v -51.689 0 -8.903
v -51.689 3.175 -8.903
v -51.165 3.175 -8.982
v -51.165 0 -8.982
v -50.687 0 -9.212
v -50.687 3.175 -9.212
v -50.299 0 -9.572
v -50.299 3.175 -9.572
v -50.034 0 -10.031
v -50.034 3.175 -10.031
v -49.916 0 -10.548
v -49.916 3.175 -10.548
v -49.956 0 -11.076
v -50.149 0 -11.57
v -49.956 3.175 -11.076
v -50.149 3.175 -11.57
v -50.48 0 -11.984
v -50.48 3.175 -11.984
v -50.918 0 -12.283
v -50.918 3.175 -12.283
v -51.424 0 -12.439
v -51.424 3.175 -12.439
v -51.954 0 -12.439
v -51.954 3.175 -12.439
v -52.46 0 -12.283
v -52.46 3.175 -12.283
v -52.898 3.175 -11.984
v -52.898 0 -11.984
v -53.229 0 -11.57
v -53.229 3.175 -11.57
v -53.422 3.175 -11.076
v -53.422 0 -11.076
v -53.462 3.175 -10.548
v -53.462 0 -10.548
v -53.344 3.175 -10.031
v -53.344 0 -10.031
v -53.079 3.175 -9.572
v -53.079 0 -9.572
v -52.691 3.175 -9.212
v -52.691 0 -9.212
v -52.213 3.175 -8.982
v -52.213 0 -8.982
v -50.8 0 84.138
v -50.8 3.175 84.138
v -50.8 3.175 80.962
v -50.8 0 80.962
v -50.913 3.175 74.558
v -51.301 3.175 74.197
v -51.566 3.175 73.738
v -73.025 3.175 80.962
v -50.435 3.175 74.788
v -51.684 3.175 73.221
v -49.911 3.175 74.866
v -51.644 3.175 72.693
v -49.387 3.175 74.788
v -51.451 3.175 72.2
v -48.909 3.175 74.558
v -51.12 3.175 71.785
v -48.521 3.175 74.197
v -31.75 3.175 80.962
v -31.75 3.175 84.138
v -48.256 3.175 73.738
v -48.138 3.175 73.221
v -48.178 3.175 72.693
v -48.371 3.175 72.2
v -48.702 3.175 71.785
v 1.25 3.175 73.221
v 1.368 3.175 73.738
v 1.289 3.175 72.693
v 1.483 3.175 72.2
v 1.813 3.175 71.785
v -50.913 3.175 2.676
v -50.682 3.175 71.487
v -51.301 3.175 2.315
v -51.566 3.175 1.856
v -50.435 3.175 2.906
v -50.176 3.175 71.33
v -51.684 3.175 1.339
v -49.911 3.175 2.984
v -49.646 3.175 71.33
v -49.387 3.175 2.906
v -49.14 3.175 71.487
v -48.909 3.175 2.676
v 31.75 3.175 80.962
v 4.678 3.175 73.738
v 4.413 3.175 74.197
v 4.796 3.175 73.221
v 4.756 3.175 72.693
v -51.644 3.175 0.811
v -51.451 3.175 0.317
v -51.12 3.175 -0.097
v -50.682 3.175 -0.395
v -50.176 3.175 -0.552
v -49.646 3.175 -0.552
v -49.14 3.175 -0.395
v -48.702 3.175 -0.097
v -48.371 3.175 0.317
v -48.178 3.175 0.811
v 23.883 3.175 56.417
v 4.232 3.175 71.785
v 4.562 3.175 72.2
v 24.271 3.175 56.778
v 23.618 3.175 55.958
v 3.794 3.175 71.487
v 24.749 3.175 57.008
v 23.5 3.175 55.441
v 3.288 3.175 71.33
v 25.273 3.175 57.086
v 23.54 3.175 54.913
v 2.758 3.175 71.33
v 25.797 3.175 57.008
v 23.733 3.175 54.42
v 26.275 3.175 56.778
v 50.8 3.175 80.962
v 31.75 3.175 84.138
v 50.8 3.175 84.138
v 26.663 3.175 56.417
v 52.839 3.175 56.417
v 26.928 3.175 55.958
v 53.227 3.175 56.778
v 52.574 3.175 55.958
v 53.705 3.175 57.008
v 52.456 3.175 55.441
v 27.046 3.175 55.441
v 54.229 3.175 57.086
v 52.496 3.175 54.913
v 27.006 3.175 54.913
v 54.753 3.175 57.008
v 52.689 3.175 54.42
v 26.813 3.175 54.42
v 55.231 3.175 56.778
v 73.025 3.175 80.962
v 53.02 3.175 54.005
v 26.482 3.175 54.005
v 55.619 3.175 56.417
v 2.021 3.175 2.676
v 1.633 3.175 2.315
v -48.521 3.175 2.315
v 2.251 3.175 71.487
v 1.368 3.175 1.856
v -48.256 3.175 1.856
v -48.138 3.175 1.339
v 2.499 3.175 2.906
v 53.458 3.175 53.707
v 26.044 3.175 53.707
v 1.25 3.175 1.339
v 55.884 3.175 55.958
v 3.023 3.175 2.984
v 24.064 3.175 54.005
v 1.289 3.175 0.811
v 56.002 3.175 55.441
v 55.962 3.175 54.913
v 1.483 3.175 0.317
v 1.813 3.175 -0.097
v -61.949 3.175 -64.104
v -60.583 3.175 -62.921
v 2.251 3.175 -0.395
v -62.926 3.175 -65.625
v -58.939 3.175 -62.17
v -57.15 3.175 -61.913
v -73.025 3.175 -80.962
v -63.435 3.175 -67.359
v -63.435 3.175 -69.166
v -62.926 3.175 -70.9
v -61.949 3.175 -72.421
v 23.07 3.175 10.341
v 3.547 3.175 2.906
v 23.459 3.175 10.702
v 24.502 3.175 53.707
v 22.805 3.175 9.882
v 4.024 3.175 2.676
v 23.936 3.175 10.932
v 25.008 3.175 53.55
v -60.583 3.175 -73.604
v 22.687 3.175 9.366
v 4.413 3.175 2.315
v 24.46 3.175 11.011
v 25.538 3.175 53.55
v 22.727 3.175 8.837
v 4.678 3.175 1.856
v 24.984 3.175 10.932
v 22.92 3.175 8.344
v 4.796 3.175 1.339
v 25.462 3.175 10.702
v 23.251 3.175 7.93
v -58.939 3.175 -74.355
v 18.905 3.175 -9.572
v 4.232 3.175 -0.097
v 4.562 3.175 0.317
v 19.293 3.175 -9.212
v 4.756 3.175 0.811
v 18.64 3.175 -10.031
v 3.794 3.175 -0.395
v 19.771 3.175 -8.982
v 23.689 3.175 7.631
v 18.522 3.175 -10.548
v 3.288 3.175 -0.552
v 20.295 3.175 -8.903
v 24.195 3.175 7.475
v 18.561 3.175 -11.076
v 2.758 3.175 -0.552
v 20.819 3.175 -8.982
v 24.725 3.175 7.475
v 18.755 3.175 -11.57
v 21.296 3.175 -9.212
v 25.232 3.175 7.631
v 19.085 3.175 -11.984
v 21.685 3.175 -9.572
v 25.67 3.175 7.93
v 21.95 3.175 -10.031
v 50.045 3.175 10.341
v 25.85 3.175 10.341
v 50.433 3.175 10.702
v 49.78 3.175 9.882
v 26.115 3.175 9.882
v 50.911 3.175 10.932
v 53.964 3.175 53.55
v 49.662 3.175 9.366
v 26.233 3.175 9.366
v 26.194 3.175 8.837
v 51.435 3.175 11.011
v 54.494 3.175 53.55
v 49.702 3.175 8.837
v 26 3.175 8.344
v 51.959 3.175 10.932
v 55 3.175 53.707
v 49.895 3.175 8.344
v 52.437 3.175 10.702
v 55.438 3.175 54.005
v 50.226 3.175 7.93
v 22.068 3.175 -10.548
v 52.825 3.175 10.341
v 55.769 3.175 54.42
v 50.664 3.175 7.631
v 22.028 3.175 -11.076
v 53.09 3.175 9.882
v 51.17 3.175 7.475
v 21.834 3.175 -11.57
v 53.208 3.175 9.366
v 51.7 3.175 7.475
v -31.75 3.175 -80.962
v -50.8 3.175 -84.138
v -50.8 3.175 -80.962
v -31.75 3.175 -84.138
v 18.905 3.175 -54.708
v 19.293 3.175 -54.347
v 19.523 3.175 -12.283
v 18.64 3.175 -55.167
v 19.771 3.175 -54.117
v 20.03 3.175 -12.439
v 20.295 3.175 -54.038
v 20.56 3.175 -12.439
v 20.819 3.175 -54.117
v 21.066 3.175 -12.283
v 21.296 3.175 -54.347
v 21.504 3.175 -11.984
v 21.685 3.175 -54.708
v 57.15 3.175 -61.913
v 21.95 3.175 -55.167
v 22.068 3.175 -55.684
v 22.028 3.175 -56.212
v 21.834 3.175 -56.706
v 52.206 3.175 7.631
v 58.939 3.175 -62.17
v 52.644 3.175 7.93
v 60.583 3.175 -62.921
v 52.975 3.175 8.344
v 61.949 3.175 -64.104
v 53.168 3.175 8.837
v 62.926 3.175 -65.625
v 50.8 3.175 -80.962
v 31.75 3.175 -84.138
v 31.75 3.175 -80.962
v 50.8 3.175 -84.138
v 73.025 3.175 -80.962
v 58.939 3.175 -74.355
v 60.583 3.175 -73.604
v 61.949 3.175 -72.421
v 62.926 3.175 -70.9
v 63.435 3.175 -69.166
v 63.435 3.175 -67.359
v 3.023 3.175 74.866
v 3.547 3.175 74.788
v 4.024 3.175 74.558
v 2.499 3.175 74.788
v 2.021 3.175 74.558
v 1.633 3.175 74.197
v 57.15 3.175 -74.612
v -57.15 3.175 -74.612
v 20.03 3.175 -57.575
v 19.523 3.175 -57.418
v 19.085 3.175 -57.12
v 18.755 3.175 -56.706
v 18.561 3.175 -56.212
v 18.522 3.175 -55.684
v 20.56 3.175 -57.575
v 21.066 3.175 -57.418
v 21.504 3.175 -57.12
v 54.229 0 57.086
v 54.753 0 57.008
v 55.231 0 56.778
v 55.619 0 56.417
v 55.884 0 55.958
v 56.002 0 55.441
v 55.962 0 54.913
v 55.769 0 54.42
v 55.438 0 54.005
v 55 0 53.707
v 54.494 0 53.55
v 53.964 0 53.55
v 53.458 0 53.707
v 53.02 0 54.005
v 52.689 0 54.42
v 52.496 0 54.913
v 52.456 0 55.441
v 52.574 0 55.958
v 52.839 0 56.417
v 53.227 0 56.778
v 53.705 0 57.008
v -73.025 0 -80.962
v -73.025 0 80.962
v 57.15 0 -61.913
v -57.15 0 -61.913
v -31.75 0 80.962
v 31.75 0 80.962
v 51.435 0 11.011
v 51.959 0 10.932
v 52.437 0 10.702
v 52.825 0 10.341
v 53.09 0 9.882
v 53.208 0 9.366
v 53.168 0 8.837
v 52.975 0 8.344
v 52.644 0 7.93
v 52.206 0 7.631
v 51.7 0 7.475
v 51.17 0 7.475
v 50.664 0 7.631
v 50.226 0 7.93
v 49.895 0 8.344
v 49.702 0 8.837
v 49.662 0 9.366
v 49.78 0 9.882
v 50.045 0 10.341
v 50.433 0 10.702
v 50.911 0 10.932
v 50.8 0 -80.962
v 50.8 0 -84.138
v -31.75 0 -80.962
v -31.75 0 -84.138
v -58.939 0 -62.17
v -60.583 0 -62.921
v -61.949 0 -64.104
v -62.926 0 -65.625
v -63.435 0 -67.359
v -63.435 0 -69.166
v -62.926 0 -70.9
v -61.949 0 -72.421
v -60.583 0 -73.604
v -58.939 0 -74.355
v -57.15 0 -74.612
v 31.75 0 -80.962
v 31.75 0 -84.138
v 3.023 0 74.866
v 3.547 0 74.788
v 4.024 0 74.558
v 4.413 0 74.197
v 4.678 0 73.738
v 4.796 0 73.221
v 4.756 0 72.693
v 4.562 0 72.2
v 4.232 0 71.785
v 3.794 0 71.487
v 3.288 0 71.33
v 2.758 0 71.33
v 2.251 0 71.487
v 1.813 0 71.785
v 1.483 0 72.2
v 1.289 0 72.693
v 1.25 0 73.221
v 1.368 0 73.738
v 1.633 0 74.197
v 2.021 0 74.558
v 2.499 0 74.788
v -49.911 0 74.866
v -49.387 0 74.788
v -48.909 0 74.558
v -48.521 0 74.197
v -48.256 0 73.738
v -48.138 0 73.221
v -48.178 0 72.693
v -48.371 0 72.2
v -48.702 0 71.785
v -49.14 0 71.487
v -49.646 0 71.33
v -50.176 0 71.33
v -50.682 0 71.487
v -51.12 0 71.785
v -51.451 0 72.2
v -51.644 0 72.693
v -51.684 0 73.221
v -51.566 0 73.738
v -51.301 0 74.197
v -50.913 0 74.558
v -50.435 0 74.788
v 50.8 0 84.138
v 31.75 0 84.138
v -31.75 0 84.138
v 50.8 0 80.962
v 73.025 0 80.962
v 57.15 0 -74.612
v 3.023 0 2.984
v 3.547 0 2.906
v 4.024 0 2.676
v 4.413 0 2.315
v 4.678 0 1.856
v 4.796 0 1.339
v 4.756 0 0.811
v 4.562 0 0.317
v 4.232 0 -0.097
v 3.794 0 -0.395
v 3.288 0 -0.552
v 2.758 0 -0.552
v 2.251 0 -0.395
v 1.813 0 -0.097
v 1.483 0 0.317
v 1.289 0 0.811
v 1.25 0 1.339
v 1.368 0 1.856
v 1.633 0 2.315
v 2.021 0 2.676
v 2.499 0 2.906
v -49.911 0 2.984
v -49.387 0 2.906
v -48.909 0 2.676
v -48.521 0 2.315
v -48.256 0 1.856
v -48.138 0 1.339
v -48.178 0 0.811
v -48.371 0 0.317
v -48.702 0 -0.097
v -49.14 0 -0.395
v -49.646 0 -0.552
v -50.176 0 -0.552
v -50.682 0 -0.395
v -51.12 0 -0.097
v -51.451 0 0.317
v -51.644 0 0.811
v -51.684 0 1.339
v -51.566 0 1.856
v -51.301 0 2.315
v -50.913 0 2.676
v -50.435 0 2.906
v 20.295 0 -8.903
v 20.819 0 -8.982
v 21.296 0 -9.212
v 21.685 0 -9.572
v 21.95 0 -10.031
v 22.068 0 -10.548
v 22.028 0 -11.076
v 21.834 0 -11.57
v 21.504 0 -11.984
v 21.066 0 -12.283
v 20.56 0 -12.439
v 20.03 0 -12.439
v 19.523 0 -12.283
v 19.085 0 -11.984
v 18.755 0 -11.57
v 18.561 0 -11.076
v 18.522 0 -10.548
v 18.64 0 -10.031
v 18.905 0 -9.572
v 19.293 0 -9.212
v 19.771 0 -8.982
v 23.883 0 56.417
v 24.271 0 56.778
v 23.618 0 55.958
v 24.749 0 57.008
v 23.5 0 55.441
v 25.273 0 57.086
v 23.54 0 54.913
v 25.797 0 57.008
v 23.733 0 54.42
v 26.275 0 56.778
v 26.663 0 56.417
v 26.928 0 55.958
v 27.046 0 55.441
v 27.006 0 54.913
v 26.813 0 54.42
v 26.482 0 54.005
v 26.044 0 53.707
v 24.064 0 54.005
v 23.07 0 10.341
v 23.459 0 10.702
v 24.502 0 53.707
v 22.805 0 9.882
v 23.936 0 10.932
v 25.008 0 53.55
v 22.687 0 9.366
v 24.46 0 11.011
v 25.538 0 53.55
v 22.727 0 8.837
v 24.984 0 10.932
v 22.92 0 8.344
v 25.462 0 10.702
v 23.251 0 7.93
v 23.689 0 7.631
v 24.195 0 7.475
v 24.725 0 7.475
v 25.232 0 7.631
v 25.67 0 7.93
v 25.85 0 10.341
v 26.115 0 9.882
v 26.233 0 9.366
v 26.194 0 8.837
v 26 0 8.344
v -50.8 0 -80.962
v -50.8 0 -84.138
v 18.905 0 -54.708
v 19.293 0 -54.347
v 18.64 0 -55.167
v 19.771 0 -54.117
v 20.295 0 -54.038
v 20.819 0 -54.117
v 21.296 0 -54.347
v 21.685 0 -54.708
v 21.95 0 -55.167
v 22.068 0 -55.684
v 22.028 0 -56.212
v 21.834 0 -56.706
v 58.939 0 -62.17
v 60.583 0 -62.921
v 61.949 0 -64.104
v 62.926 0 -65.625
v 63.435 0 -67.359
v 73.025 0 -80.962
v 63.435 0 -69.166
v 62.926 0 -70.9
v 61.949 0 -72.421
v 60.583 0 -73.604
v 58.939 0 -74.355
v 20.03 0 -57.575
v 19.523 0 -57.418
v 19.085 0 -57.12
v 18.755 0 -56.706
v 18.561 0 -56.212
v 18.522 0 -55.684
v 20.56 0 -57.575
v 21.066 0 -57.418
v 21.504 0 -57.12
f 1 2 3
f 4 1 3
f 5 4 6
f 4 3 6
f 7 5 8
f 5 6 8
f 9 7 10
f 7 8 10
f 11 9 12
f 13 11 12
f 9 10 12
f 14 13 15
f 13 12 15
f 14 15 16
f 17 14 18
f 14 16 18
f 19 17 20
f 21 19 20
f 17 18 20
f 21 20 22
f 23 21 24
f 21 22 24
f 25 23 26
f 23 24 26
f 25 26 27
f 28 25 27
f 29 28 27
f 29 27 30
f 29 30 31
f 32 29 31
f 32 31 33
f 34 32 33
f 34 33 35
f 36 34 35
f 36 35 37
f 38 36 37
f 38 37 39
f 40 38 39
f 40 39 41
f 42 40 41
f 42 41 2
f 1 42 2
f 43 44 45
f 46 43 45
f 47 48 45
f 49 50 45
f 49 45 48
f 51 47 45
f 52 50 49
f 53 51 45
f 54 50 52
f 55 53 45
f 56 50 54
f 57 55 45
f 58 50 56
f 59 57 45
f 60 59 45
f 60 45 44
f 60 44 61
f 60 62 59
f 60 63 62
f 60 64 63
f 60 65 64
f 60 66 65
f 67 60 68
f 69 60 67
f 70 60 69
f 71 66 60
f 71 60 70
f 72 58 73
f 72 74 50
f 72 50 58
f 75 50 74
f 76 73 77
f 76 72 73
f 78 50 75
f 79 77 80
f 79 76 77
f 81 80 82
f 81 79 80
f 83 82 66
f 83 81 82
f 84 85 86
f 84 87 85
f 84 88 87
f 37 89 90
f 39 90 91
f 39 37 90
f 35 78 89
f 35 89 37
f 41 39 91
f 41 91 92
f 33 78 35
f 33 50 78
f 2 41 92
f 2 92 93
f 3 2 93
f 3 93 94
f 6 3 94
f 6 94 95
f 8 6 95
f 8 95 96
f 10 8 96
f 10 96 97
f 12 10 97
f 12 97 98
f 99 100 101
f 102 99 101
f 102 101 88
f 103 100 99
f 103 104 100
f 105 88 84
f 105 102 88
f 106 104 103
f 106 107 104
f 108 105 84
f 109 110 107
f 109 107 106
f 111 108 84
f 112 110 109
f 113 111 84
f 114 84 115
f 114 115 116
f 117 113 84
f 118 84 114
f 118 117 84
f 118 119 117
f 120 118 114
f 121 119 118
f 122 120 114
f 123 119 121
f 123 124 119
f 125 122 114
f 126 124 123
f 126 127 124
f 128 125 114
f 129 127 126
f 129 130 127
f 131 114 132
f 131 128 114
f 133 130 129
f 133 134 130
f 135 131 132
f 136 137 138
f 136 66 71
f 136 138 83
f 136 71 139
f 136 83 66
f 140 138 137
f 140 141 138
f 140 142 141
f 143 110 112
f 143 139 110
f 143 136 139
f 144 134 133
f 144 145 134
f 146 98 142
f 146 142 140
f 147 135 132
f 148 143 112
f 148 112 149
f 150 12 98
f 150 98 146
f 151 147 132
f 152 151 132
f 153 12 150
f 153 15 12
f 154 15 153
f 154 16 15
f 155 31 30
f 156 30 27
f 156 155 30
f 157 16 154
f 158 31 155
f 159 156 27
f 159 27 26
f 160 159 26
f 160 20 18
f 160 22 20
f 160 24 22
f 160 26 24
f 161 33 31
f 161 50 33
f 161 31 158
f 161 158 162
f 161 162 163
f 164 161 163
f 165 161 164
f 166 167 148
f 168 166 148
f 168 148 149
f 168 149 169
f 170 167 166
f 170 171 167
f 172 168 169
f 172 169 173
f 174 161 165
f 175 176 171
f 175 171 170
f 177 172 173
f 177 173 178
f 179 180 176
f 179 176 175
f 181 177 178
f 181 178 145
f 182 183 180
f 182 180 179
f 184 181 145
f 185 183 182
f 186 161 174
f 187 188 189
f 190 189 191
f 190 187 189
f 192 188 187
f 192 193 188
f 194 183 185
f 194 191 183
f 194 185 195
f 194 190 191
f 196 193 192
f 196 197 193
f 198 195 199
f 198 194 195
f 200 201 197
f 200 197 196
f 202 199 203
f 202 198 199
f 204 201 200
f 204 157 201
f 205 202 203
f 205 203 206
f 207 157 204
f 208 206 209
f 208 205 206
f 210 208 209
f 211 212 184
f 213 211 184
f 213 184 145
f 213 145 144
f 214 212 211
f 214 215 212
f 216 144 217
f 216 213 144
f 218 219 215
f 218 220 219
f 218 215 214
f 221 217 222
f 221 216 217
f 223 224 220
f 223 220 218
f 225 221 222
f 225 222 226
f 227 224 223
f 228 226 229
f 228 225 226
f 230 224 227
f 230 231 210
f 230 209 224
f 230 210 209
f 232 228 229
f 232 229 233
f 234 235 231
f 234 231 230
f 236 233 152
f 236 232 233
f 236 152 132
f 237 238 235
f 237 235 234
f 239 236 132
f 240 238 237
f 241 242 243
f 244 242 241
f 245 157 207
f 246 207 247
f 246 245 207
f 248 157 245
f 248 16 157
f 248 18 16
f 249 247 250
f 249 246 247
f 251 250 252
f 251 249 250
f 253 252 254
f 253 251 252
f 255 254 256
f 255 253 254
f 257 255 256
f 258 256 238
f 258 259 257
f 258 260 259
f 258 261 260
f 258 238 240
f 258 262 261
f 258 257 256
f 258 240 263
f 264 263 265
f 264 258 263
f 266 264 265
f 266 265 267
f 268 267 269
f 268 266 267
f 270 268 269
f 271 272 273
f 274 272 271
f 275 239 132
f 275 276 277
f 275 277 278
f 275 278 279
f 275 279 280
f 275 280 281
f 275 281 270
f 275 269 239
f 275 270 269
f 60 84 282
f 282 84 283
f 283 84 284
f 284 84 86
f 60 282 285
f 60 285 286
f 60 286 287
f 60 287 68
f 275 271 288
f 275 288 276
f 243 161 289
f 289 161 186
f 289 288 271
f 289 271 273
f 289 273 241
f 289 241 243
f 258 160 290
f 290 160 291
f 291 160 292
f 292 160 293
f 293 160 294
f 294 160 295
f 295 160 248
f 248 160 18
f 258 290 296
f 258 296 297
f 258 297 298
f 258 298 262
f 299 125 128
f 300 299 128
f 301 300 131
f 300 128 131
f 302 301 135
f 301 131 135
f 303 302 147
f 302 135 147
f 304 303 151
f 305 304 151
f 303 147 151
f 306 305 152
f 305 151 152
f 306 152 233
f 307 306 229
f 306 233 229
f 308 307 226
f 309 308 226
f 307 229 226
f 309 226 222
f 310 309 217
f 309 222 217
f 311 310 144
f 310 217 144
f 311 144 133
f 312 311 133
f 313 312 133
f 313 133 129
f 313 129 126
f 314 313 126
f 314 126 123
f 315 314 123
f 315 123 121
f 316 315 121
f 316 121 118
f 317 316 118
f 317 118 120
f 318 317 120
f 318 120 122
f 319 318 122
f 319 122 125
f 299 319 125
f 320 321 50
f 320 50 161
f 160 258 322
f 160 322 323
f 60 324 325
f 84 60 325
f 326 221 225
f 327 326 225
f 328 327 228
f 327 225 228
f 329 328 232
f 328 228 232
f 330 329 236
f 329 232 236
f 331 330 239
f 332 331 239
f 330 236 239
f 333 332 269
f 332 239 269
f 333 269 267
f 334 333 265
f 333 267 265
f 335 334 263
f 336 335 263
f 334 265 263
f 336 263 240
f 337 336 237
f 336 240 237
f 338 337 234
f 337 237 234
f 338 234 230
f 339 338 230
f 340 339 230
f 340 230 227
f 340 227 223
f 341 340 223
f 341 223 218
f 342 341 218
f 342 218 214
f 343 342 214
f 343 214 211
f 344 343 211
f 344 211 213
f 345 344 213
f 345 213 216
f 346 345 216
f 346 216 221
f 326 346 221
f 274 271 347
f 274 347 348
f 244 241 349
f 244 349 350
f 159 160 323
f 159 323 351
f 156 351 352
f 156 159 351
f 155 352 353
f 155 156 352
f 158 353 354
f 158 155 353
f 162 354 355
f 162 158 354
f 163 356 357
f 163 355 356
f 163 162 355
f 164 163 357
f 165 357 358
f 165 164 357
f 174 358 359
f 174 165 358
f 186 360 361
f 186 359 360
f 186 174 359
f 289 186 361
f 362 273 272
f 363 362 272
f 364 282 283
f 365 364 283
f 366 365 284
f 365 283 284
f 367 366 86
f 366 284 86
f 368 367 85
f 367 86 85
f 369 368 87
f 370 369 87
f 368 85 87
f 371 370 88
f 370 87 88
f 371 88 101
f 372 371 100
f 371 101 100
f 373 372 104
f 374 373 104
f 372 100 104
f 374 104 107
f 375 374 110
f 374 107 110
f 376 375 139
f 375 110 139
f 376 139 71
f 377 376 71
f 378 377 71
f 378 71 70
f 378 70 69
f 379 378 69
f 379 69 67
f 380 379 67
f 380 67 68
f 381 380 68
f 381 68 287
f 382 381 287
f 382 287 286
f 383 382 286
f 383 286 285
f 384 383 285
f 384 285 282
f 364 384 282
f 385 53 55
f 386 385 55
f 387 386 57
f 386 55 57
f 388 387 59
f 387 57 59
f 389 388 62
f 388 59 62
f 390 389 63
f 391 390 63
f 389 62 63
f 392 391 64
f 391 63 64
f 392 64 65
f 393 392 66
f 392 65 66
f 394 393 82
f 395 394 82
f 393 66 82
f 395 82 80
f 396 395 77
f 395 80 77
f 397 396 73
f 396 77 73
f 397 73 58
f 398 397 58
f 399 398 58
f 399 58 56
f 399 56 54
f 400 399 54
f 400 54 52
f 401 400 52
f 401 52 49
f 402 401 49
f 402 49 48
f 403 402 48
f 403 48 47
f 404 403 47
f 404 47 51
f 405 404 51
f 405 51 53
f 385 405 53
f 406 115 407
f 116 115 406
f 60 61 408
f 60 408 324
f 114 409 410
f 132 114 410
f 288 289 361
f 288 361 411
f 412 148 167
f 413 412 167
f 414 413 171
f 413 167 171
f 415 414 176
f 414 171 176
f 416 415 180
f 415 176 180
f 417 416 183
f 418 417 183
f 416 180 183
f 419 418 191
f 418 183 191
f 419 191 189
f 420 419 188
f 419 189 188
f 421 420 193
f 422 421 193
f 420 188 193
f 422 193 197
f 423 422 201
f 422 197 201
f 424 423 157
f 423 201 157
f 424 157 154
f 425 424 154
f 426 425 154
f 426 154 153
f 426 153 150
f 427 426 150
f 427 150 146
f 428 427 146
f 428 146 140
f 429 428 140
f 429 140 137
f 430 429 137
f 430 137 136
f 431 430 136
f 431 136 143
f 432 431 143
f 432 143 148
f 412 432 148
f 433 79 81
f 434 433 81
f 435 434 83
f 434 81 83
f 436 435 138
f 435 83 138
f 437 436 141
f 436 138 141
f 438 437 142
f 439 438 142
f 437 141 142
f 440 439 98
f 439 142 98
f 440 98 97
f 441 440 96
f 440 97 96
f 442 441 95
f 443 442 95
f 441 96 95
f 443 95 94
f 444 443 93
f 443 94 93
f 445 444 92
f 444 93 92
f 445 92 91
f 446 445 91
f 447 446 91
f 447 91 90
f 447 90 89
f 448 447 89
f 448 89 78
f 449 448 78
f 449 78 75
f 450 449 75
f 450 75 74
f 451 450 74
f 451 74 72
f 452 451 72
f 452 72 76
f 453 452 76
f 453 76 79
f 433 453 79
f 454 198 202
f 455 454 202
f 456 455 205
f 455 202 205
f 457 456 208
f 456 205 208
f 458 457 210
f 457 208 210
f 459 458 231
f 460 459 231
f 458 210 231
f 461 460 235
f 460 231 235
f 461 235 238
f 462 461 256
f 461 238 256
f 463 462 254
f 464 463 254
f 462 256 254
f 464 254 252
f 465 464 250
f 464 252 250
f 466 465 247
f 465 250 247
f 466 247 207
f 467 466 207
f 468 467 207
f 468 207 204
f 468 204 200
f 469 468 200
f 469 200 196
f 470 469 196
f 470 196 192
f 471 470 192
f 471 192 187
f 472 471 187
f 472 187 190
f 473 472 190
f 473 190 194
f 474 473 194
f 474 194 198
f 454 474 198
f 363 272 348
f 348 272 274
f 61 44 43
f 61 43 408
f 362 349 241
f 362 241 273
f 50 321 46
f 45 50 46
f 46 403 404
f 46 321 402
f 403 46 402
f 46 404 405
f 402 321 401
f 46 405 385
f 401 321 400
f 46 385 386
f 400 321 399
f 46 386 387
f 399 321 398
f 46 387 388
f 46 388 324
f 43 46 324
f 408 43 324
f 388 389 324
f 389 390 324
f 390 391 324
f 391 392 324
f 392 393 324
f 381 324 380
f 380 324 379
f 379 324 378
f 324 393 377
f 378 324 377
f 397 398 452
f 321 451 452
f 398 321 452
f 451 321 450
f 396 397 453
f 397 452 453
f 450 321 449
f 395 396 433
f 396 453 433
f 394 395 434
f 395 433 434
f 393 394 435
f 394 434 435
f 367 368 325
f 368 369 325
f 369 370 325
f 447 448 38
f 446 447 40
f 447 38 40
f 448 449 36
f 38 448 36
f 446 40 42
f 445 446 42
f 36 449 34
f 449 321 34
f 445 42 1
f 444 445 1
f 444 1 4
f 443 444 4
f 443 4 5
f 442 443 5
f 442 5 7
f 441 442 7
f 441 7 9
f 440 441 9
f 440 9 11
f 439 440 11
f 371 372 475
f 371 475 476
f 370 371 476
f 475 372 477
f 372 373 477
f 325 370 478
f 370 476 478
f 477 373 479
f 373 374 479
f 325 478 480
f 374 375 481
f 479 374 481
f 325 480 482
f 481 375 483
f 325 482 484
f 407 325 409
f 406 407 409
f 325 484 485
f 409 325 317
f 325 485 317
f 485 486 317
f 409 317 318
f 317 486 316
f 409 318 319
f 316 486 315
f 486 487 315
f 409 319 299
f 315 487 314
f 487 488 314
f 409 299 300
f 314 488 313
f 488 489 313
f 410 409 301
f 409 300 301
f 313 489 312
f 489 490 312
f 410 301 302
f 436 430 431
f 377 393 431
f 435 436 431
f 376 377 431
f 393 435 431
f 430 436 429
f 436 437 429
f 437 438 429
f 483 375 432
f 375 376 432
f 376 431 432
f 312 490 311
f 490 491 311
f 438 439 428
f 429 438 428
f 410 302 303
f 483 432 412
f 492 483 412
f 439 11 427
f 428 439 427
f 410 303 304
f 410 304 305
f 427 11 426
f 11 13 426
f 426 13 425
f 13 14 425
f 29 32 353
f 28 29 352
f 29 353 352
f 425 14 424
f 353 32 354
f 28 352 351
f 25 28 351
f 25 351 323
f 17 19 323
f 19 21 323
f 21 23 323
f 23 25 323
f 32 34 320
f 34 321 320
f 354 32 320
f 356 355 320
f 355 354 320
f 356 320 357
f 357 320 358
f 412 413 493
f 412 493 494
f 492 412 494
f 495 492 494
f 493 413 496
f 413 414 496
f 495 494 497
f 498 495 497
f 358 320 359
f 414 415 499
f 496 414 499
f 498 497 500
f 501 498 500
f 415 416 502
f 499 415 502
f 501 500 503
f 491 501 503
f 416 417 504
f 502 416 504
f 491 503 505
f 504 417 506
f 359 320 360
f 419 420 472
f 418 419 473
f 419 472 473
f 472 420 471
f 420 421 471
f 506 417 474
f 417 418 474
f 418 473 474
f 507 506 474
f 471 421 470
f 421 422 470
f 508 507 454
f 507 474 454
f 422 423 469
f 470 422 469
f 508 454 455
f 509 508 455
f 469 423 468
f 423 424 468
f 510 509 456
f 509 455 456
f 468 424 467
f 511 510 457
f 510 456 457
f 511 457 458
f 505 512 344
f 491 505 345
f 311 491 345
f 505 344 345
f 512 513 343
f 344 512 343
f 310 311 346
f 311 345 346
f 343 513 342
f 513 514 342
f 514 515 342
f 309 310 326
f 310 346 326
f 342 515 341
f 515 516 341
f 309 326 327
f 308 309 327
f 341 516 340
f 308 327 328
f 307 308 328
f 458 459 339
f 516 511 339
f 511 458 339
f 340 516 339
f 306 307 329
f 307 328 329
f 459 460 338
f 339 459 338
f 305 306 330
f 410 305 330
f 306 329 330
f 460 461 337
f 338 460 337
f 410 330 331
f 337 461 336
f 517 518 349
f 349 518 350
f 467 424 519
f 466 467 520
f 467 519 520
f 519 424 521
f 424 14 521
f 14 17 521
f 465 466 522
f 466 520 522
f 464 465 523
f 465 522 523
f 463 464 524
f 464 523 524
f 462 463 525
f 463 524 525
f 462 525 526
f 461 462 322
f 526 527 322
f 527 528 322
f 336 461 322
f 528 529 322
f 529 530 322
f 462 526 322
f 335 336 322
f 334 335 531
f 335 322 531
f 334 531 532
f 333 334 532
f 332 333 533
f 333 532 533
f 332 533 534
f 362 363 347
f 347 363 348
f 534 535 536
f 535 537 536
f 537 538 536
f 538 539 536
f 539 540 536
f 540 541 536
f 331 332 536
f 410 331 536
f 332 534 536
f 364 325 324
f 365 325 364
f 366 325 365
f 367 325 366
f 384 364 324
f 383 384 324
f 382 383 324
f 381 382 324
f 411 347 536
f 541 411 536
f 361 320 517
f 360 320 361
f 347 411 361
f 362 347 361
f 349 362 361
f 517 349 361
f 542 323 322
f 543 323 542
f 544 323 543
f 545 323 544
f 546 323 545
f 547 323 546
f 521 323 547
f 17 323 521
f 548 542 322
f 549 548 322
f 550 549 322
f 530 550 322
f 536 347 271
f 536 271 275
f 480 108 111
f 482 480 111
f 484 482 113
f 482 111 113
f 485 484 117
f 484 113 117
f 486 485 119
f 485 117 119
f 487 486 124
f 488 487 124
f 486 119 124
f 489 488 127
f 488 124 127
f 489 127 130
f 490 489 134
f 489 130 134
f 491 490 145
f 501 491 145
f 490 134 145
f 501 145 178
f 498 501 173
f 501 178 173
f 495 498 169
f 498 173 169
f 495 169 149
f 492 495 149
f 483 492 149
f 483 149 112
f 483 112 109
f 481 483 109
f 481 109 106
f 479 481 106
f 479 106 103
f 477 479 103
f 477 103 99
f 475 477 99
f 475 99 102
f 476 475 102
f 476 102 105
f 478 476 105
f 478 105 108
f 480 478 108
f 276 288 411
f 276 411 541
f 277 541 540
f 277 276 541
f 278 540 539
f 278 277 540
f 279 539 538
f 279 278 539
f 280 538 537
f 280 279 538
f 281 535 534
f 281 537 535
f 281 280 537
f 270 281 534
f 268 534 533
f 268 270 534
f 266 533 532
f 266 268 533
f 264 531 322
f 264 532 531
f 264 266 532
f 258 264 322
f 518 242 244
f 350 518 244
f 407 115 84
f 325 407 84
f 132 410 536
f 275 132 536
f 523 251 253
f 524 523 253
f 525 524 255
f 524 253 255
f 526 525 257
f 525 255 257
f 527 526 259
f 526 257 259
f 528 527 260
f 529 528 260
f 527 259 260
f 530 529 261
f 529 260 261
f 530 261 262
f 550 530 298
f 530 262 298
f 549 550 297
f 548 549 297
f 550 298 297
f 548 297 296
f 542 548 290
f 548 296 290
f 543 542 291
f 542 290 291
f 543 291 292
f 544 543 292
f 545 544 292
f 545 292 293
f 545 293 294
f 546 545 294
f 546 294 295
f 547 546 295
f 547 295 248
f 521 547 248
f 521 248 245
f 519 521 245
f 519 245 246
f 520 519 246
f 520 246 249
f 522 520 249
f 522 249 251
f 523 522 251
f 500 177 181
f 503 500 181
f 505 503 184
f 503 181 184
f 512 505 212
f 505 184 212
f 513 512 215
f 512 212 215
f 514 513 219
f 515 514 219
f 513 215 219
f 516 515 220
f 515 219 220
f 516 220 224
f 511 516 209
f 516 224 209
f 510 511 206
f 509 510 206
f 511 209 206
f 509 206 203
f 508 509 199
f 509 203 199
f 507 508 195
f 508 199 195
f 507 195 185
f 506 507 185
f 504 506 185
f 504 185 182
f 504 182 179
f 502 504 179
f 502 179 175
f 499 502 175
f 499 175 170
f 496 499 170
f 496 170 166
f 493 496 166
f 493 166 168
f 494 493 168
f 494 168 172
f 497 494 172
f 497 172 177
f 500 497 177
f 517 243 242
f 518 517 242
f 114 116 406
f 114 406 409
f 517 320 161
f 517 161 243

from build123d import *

# Parameters (mm, degrees)
SKETCH1_W           = 146.05
SKETCH1_H           = 161.925
BOSS_EXTRUDE1_DEPTH = 3.175
SKETCH2_W           = 19.05
SKETCH2_H           = 3.175
BOSS_EXTRUDE2_DEPTH = 3.175
CUT_EXTRUDE1_DEPTH  = 112.453354172
CUT_EXTRUDE2_REACH  = 113.453
SKETCH4_R           = 1.778


with BuildPart() as part:
    # Sketch1 → Boss-Extrude1 (new body)
    with BuildSketch(Plane(origin=(0, 0, 0), x_dir=(1, 0, 0), z_dir=(0, 1, 0))):
        Rectangle(SKETCH1_W, SKETCH1_H)
    extrude(amount=BOSS_EXTRUDE1_DEPTH)

    # Sketch2 → Boss-Extrude2 (add)
    with BuildSketch(Plane(origin=(0, 3.175, 0), x_dir=(1, 0, 0), z_dir=(0, 1, 0))):
        with Locations((-41.275, 82.55)):
            Rectangle(SKETCH2_W, SKETCH2_H)
        with Locations((41.275, 82.55)):
            Rectangle(SKETCH2_W, SKETCH2_H)
        with Locations((41.275, -82.55)):
            Rectangle(SKETCH2_W, SKETCH2_H)
        with Locations((-41.275, -82.55)):
            Rectangle(SKETCH2_W, SKETCH2_H)
    extrude(amount=-BOSS_EXTRUDE2_DEPTH)

    # Sketch3 → Cut-Extrude1 (cut, through all)
    with BuildSketch(Plane(origin=(0, 3.175, 0), x_dir=(1, 0, 0), z_dir=(0, 1, 0))):
        with BuildLine():
            Line((-57.15, 74.6125), (57.15, 74.6125))
            ThreePointArc((57.15, 74.6125), (63.5, 68.2625), (57.15, 61.9125))
            Line((57.15, 61.9125), (-57.15, 61.9125))
            ThreePointArc((-57.15, 61.9125), (-63.5, 68.2625), (-57.15, 74.6125))
        make_face()
    extrude(amount=-CUT_EXTRUDE1_DEPTH, mode=Mode.SUBTRACT)

    # Sketch4 → Cut-Extrude2 (cut, up to next)
    with BuildSketch(Plane(origin=(0, 3.175, 0), x_dir=(1, 0, 0), z_dir=(0, 1, 0)), mode=Mode.PRIVATE) as cut_extrude2_sk1:
        with Locations(Location((54.229, -55.3085, 0), (0, 0, 270))):
            Circle(SKETCH4_R)
    cut_extrude2_tool1 = extrude(cut_extrude2_sk1.sketch, amount=-CUT_EXTRUDE2_REACH, mode=Mode.PRIVATE) & part.part
    # Sketch4 → Cut-Extrude2 (cut, up to next)
    with BuildSketch(Plane(origin=(0, 3.175, 0), x_dir=(1, 0, 0), z_dir=(0, 1, 0)), mode=Mode.PRIVATE) as cut_extrude2_sk2:
        with Locations(Location((25.273, -55.3085, 0), (0, 0, 270))):
            Circle(SKETCH4_R)
    cut_extrude2_tool2 = extrude(cut_extrude2_sk2.sketch, amount=-CUT_EXTRUDE2_REACH, mode=Mode.PRIVATE) & part.part
    # Sketch4 → Cut-Extrude2 (cut, up to next)
    with BuildSketch(Plane(origin=(0, 3.175, 0), x_dir=(1, 0, 0), z_dir=(0, 1, 0)), mode=Mode.PRIVATE) as cut_extrude2_sk3:
        with Locations(Location((24.4602, -9.2329, 0), (0, 0, 270))):
            Circle(SKETCH4_R)
    cut_extrude2_tool3 = extrude(cut_extrude2_sk3.sketch, amount=-CUT_EXTRUDE2_REACH, mode=Mode.PRIVATE) & part.part
    # Sketch4 → Cut-Extrude2 (cut, up to next)
    with BuildSketch(Plane(origin=(0, 3.175, 0), x_dir=(1, 0, 0), z_dir=(0, 1, 0)), mode=Mode.PRIVATE) as cut_extrude2_sk4:
        with Locations(Location((51.435, -9.2329, 0), (0, 0, 270))):
            Circle(SKETCH4_R)
    cut_extrude2_tool4 = extrude(cut_extrude2_sk4.sketch, amount=-CUT_EXTRUDE2_REACH, mode=Mode.PRIVATE) & part.part
    # Sketch4 → Cut-Extrude2 (cut, up to next)
    with BuildSketch(Plane(origin=(0, 3.175, 0), x_dir=(1, 0, 0), z_dir=(0, 1, 0)), mode=Mode.PRIVATE) as cut_extrude2_sk5:
        with Locations(Location((3.0226, -73.0885, 0), (0, 0, 270))):
            Circle(SKETCH4_R)
    cut_extrude2_tool5 = extrude(cut_extrude2_sk5.sketch, amount=-CUT_EXTRUDE2_REACH, mode=Mode.PRIVATE) & part.part
    # Sketch4 → Cut-Extrude2 (cut, up to next)
    with BuildSketch(Plane(origin=(0, 3.175, 0), x_dir=(1, 0, 0), z_dir=(0, 1, 0)), mode=Mode.PRIVATE) as cut_extrude2_sk6:
        with Locations(Location((-49.911, -73.0885, 0), (0, 0, 270))):
            Circle(SKETCH4_R)
    cut_extrude2_tool6 = extrude(cut_extrude2_sk6.sketch, amount=-CUT_EXTRUDE2_REACH, mode=Mode.PRIVATE) & part.part
    # Sketch4 → Cut-Extrude2 (cut, up to next)
    with BuildSketch(Plane(origin=(0, 3.175, 0), x_dir=(1, 0, 0), z_dir=(0, 1, 0)), mode=Mode.PRIVATE) as cut_extrude2_sk7:
        with Locations(Location((-49.911, -1.2065, 0), (0, 0, 270))):
            Circle(SKETCH4_R)
    cut_extrude2_tool7 = extrude(cut_extrude2_sk7.sketch, amount=-CUT_EXTRUDE2_REACH, mode=Mode.PRIVATE) & part.part
    # Sketch4 → Cut-Extrude2 (cut, up to next)
    with BuildSketch(Plane(origin=(0, 3.175, 0), x_dir=(1, 0, 0), z_dir=(0, 1, 0)), mode=Mode.PRIVATE) as cut_extrude2_sk8:
        with Locations(Location((3.0226, -1.2065, 0), (0, 0, 270))):
            Circle(SKETCH4_R)
    cut_extrude2_tool8 = extrude(cut_extrude2_sk8.sketch, amount=-CUT_EXTRUDE2_REACH, mode=Mode.PRIVATE) & part.part
    # Sketch4 → Cut-Extrude2 (cut, up to next)
    with BuildSketch(Plane(origin=(0, 3.175, 0), x_dir=(1, 0, 0), z_dir=(0, 1, 0)), mode=Mode.PRIVATE) as cut_extrude2_sk9:
        with Locations(Location((-51.689, 10.6807, 0), (0, 0, 270))):
            Circle(SKETCH4_R)
    cut_extrude2_tool9 = extrude(cut_extrude2_sk9.sketch, amount=-CUT_EXTRUDE2_REACH, mode=Mode.PRIVATE) & part.part
    # Sketch4 → Cut-Extrude2 (cut, up to next)
    with BuildSketch(Plane(origin=(0, 3.175, 0), x_dir=(1, 0, 0), z_dir=(0, 1, 0)), mode=Mode.PRIVATE) as cut_extrude2_sk10:
        with Locations(Location((20.2946, 10.6807, 0), (0, 0, 270))):
            Circle(SKETCH4_R)
    cut_extrude2_tool10 = extrude(cut_extrude2_sk10.sketch, amount=-CUT_EXTRUDE2_REACH, mode=Mode.PRIVATE) & part.part
    # Sketch4 → Cut-Extrude2 (cut, up to next)
    with BuildSketch(Plane(origin=(0, 3.175, 0), x_dir=(1, 0, 0), z_dir=(0, 1, 0)), mode=Mode.PRIVATE) as cut_extrude2_sk11:
        with Locations(Location((20.2946, 55.8165, 0), (0, 0, 270))):
            Circle(SKETCH4_R)
    cut_extrude2_tool11 = extrude(cut_extrude2_sk11.sketch, amount=-CUT_EXTRUDE2_REACH, mode=Mode.PRIVATE) & part.part
    add(cut_extrude2_tool1.solids().sort_by_distance((54.229, 3.175, 55.3085))[0], mode=Mode.SUBTRACT)
    add(cut_extrude2_tool2.solids().sort_by_distance((25.273, 3.175, 55.3085))[0], mode=Mode.SUBTRACT)
    add(cut_extrude2_tool3.solids().sort_by_distance((24.4602, 3.175, 9.2329))[0], mode=Mode.SUBTRACT)
    add(cut_extrude2_tool4.solids().sort_by_distance((51.435, 3.175, 9.2329))[0], mode=Mode.SUBTRACT)
    add(cut_extrude2_tool5.solids().sort_by_distance((3.0226, 3.175, 73.0885))[0], mode=Mode.SUBTRACT)
    add(cut_extrude2_tool6.solids().sort_by_distance((-49.911, 3.175, 73.0885))[0], mode=Mode.SUBTRACT)
    add(cut_extrude2_tool7.solids().sort_by_distance((-49.911, 3.175, 1.2065))[0], mode=Mode.SUBTRACT)
    add(cut_extrude2_tool8.solids().sort_by_distance((3.0226, 3.175, 1.2065))[0], mode=Mode.SUBTRACT)
    add(cut_extrude2_tool9.solids().sort_by_distance((-51.689, 3.175, -10.6807))[0], mode=Mode.SUBTRACT)
    add(cut_extrude2_tool10.solids().sort_by_distance((20.2946, 3.175, -10.6807))[0], mode=Mode.SUBTRACT)
    add(cut_extrude2_tool11.solids().sort_by_distance((20.2946, 3.175, -55.8165))[0], mode=Mode.SUBTRACT)


solid = part.part
